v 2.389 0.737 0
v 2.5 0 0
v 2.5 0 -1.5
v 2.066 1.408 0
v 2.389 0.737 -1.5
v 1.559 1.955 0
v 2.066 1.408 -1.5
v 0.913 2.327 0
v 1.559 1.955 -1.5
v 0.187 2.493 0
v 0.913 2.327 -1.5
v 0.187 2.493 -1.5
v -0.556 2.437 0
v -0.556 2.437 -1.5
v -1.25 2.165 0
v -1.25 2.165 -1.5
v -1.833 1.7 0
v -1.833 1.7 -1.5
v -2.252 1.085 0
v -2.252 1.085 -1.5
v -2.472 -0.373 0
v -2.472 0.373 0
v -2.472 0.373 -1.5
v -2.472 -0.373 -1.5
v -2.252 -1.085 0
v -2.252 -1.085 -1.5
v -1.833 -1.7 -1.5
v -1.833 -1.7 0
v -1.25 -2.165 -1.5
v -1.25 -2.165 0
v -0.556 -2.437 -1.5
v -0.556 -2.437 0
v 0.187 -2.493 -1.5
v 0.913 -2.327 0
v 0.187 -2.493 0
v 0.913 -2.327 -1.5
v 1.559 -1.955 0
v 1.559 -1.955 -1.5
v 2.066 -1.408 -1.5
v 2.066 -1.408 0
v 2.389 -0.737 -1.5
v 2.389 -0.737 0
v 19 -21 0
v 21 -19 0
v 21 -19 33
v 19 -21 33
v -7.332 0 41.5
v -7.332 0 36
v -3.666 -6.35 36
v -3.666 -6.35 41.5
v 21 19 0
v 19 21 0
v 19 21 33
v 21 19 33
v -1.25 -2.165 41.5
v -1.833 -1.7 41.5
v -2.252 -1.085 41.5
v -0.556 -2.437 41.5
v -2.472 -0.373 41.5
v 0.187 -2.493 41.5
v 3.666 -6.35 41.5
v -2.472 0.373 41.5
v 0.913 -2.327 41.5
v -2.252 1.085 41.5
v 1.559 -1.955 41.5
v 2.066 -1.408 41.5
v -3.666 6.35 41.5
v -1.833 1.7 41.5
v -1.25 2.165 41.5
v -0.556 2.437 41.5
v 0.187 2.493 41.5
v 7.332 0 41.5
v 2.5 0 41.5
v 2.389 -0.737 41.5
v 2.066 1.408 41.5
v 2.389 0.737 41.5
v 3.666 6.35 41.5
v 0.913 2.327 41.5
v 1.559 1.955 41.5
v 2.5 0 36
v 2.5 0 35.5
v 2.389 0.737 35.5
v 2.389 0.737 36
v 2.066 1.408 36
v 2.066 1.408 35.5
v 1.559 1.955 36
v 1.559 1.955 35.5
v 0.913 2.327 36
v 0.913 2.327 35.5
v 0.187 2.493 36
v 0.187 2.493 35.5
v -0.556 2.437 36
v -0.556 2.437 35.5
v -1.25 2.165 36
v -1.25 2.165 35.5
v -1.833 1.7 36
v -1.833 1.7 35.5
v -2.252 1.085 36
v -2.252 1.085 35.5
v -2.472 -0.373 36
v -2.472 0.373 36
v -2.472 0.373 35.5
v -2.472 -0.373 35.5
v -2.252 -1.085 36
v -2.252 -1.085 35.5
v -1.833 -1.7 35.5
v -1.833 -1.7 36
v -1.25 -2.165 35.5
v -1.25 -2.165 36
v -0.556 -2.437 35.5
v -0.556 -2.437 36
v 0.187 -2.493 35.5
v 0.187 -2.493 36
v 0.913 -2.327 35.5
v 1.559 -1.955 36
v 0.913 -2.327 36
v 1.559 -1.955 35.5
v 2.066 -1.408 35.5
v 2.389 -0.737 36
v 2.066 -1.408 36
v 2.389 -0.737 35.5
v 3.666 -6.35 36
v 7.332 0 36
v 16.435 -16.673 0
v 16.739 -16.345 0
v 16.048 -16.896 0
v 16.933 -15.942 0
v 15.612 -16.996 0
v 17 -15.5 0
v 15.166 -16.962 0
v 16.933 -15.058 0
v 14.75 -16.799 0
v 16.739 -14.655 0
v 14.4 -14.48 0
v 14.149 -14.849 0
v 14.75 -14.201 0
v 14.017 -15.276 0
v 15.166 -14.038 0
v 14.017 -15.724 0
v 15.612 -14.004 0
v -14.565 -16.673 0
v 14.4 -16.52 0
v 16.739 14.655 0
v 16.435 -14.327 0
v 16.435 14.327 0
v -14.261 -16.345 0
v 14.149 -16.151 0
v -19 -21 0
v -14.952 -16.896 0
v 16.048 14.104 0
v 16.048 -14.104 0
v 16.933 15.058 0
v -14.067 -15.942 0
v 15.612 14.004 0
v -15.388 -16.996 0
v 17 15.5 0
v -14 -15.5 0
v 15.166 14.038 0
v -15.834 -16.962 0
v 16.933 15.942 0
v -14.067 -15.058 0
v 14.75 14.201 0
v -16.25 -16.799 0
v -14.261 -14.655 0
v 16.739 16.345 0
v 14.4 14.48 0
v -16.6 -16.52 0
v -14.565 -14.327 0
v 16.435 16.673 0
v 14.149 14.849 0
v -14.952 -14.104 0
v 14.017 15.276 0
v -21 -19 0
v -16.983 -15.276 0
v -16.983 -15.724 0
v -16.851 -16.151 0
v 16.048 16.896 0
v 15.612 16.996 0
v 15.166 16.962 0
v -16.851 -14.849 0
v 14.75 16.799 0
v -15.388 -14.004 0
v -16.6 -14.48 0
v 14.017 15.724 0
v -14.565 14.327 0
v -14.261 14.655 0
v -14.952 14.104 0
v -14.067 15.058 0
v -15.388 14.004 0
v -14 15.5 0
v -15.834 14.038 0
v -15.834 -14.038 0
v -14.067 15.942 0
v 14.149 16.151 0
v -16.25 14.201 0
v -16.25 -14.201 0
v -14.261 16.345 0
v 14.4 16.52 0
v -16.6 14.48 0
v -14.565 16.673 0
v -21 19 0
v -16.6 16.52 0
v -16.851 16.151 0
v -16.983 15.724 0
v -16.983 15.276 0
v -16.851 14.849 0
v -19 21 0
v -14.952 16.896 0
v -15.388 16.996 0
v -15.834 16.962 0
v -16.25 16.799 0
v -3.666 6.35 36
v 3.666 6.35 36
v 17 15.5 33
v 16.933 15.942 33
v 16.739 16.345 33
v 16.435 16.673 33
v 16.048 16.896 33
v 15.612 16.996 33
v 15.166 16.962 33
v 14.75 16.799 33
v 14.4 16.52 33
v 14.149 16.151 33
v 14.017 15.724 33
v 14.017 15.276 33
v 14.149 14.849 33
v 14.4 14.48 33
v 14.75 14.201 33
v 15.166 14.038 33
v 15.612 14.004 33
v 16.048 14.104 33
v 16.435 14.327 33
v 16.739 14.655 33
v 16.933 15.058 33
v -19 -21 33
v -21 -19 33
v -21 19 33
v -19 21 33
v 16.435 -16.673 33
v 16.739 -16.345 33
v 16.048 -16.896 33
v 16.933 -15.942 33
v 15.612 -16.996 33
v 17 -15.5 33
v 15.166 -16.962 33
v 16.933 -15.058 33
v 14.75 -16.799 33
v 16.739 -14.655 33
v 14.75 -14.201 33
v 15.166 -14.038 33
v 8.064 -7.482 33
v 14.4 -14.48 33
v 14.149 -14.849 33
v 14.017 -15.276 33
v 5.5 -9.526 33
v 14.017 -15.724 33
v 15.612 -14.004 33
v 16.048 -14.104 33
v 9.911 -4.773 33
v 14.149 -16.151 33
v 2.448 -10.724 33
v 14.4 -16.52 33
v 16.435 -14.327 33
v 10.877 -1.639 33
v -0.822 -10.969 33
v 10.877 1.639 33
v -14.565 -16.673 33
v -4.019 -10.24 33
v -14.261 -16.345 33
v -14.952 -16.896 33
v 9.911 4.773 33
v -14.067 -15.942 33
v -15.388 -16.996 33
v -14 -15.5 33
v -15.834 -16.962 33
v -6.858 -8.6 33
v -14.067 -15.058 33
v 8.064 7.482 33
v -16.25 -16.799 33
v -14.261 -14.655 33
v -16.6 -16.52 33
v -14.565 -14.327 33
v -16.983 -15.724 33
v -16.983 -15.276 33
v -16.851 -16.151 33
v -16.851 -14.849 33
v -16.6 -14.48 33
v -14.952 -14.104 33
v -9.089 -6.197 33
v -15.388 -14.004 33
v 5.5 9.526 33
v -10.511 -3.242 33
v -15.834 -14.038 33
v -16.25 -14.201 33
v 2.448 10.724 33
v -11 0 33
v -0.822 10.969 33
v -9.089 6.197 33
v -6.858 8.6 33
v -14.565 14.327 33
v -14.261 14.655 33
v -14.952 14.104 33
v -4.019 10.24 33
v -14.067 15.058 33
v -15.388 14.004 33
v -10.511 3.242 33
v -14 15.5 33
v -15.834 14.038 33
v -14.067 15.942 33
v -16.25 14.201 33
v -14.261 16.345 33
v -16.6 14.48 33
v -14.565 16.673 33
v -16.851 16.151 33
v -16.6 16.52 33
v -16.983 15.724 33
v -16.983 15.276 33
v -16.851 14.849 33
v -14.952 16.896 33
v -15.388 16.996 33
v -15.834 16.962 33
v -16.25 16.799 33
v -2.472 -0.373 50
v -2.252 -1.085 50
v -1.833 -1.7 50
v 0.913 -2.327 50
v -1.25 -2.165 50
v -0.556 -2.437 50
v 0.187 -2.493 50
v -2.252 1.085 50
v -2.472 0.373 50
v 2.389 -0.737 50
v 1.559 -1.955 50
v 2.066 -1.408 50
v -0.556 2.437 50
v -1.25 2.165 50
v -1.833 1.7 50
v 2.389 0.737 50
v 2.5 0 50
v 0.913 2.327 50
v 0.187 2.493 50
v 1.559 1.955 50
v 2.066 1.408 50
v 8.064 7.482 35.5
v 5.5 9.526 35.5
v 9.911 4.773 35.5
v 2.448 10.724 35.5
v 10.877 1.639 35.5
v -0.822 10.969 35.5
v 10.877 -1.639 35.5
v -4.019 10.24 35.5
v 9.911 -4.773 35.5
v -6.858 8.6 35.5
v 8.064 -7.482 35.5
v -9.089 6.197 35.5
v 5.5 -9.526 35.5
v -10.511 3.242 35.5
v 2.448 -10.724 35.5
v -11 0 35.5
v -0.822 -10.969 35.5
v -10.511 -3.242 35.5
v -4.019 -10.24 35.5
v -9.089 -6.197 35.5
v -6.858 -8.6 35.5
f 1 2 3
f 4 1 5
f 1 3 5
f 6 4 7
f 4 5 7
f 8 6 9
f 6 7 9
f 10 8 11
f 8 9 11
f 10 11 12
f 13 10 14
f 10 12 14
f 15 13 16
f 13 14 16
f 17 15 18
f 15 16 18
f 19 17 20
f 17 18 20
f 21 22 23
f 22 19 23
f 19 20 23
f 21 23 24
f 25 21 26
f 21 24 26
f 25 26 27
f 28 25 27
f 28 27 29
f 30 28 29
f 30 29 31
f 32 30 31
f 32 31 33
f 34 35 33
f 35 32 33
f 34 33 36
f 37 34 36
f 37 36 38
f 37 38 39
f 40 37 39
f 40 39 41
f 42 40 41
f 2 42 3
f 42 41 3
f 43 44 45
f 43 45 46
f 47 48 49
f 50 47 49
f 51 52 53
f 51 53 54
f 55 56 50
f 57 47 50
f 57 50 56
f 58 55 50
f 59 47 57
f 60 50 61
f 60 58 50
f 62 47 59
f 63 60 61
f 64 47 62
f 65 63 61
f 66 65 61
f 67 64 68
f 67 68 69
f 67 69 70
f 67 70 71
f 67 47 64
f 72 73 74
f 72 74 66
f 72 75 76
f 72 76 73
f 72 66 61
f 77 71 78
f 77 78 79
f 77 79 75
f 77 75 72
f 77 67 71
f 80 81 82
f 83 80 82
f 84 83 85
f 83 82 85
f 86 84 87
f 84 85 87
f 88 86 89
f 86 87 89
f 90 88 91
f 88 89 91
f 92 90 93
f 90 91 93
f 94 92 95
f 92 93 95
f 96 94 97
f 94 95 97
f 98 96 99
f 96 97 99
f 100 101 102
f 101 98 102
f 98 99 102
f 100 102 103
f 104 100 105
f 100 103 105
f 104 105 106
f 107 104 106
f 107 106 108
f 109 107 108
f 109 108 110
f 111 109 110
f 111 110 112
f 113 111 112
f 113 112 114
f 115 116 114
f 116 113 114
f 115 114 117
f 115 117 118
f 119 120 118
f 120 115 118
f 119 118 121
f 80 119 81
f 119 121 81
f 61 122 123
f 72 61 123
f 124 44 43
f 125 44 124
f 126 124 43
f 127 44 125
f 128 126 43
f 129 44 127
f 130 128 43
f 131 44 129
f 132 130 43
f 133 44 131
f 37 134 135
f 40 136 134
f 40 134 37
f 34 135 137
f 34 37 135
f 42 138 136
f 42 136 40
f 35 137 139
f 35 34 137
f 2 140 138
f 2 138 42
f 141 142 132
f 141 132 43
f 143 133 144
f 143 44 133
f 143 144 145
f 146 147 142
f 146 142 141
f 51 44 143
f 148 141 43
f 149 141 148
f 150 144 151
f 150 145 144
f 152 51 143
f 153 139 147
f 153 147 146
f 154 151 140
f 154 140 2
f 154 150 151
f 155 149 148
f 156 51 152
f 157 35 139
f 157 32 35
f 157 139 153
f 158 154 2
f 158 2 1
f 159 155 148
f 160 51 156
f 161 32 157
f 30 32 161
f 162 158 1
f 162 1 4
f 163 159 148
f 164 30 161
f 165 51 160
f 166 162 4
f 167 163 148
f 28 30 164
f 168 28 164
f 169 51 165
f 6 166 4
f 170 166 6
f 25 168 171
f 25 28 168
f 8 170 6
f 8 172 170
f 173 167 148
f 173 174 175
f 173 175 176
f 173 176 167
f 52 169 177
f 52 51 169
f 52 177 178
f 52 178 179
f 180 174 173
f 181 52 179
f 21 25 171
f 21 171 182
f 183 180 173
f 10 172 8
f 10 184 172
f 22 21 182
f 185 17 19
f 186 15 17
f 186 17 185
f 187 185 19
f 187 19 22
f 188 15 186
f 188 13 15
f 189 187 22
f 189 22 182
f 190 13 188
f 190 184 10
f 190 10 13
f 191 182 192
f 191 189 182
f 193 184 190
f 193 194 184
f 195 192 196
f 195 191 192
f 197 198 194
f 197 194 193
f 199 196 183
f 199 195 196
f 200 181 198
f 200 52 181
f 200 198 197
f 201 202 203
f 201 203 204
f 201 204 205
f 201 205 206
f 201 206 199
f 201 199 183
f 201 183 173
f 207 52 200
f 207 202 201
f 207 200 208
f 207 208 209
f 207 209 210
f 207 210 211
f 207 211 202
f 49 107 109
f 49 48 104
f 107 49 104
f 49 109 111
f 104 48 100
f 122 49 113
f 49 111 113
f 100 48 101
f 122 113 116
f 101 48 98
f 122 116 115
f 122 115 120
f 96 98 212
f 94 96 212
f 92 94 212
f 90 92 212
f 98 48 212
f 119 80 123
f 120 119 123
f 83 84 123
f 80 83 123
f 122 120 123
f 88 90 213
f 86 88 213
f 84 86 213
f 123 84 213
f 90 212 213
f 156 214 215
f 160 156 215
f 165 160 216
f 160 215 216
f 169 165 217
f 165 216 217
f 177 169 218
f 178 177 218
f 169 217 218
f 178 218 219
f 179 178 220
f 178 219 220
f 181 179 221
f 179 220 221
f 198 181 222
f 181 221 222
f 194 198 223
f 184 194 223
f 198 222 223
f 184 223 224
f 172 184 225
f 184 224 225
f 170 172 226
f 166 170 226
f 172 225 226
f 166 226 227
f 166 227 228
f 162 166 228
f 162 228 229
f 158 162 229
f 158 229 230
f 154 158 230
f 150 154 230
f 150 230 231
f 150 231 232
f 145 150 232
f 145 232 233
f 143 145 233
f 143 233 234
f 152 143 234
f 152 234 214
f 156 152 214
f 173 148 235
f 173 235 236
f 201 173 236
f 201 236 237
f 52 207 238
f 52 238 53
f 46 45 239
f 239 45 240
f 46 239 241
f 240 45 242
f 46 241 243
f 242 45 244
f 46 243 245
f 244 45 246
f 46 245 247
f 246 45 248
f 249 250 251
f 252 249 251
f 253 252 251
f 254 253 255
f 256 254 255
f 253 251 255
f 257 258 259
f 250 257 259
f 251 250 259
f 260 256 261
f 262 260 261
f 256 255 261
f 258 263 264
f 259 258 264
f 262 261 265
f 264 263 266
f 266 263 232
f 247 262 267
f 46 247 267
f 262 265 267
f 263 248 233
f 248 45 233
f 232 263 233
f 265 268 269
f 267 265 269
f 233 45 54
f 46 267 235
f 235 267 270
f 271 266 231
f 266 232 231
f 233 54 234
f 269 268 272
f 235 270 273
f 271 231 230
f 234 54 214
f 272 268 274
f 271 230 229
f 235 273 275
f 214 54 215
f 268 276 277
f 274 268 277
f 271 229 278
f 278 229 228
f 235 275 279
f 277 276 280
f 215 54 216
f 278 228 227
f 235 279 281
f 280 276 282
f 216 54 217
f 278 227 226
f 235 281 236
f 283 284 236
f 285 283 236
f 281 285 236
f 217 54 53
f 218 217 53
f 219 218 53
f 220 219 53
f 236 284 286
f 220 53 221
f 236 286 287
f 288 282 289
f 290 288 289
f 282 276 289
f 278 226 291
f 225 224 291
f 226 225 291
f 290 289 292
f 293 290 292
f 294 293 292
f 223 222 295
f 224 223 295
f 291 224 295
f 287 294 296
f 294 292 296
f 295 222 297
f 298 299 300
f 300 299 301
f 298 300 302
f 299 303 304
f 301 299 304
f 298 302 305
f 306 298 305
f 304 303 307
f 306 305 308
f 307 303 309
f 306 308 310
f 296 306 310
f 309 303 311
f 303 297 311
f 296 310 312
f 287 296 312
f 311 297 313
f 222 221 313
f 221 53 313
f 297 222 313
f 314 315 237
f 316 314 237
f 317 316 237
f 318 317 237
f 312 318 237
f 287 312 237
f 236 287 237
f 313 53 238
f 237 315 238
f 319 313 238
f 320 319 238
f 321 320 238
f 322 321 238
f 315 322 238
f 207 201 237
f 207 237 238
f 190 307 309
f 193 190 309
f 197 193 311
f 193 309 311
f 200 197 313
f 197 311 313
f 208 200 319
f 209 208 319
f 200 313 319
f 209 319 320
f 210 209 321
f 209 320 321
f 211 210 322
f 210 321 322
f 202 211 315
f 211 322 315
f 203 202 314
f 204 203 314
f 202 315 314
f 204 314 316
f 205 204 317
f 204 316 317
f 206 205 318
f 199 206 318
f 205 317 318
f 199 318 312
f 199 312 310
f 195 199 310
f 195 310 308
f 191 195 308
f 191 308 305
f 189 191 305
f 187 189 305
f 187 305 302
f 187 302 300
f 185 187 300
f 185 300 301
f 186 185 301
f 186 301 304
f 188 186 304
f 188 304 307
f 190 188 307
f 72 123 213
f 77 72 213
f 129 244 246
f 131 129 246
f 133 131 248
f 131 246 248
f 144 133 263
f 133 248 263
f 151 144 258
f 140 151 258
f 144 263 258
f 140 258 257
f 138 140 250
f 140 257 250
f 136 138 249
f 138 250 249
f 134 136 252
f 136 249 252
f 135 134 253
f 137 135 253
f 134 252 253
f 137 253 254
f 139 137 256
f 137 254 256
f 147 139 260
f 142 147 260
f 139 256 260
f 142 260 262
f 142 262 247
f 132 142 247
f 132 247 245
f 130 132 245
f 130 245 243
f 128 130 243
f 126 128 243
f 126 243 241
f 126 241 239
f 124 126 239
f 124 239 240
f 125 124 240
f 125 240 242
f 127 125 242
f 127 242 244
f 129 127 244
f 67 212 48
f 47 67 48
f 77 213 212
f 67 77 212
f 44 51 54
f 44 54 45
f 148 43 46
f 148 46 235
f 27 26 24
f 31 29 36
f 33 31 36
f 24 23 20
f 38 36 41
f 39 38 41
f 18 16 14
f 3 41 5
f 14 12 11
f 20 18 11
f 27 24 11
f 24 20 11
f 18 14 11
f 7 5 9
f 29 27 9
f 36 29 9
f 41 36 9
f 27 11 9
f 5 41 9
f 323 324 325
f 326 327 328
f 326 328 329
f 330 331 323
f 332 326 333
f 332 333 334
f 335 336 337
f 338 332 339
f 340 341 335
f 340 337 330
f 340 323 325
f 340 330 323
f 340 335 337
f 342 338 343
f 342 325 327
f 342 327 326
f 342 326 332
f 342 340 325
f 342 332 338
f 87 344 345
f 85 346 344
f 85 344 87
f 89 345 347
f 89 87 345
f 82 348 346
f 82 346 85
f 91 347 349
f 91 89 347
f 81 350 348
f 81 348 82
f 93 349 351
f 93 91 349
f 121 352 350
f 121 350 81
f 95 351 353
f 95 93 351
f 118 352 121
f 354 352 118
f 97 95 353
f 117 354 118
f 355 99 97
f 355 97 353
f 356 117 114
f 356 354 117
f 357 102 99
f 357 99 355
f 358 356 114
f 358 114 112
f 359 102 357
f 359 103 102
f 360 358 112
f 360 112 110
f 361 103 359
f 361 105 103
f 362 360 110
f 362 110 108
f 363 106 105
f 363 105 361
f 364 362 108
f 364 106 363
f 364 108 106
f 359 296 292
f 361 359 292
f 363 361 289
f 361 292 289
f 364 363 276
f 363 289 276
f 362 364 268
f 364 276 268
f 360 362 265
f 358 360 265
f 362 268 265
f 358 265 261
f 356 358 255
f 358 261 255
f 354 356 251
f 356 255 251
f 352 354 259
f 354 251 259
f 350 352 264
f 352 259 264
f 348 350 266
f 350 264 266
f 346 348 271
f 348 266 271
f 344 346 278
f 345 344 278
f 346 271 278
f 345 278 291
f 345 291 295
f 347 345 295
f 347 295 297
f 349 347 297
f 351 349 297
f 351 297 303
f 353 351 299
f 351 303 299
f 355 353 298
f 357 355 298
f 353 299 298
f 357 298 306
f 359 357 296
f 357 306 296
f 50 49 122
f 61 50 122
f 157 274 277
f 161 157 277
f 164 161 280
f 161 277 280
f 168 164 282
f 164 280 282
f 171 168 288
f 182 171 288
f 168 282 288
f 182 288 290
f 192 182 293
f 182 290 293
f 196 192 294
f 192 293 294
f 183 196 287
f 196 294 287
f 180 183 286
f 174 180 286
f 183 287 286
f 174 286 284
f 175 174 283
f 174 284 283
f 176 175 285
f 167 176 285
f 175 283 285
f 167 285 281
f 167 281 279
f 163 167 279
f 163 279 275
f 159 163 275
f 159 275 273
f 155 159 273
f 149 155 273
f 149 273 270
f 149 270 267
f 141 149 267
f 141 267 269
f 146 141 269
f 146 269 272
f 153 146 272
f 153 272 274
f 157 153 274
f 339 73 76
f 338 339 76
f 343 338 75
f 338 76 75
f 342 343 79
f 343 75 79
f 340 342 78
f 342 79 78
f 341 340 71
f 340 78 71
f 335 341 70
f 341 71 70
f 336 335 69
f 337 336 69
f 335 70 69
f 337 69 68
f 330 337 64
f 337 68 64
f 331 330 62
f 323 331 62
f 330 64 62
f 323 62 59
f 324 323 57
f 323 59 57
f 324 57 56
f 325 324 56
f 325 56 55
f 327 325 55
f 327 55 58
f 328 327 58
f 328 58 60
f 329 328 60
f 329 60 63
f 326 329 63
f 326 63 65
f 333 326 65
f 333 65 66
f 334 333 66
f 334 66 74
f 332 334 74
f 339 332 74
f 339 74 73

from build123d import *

# Parameters (mm, degrees)
EXTRUDE1_DEPTH      = 33
SKETCH2_R           = 1.5
EXTRUDE2_DEPTH      = 43
SKETCH3_R           = 11
EXTRUDE3_DEPTH      = 2.5
EXTRUDE4_DEPTH      = 14.5
EXTRUDE4_DEPTH_BACK = 37
SKETCH4_R           = 2.5
BOSS_EXTRUDE1_START = 0.5
BOSS_EXTRUDE1_DEPTH = 5.5


with BuildPart() as part:
    # Sketch1 → Extrude1 (new body)
    with BuildSketch(Plane.XY):
        Polygon((-21, 19), (-19, 21), (19, 21), (21, 19), (21, -19), (19, -21), (-19, -21), (-21, -19), align=None)
    extrude(amount=EXTRUDE1_DEPTH)

    # Sketch2 → Extrude2 (cut)
    with BuildSketch(Plane.XY.offset(33)):
        with Locations((-15.5, 15.5)):
            Circle(SKETCH2_R)
        with Locations((15.5, 15.5)):
            Circle(SKETCH2_R)
        with Locations((-15.5, -15.5)):
            Circle(SKETCH2_R)
        with Locations((15.5, -15.5)):
            Circle(SKETCH2_R)
    extrude(amount=-EXTRUDE2_DEPTH, mode=Mode.SUBTRACT)

    # Sketch3 → Extrude3 (add)
    with BuildSketch(Plane.XY.offset(33)):
        with Locations(Location((0, 0, 0), (0, 0, 180))):
            Circle(SKETCH3_R)
    extrude(amount=EXTRUDE3_DEPTH)

    # Sketch4 → Extrude4 (add, two sides: drawn at the far end of the back side and taken through both)
    with BuildSketch(Plane.XY.offset(35.5).offset(-EXTRUDE4_DEPTH_BACK)):
        Circle(SKETCH4_R)
    extrude(amount=EXTRUDE4_DEPTH + EXTRUDE4_DEPTH_BACK)

    # Sketch5 → Boss-Extrude1 (add)
    with BuildSketch(Plane.XY.offset(35.5).offset(BOSS_EXTRUDE1_START)):
        Polygon((7.332348419, 0), (3.666174209, 6.35), (-3.666174209, 6.35), (-7.332348419, 0), (-3.666174209, -6.35), (3.666174209, -6.35), align=None)
    extrude(amount=BOSS_EXTRUDE1_DEPTH)


solid = part.part
